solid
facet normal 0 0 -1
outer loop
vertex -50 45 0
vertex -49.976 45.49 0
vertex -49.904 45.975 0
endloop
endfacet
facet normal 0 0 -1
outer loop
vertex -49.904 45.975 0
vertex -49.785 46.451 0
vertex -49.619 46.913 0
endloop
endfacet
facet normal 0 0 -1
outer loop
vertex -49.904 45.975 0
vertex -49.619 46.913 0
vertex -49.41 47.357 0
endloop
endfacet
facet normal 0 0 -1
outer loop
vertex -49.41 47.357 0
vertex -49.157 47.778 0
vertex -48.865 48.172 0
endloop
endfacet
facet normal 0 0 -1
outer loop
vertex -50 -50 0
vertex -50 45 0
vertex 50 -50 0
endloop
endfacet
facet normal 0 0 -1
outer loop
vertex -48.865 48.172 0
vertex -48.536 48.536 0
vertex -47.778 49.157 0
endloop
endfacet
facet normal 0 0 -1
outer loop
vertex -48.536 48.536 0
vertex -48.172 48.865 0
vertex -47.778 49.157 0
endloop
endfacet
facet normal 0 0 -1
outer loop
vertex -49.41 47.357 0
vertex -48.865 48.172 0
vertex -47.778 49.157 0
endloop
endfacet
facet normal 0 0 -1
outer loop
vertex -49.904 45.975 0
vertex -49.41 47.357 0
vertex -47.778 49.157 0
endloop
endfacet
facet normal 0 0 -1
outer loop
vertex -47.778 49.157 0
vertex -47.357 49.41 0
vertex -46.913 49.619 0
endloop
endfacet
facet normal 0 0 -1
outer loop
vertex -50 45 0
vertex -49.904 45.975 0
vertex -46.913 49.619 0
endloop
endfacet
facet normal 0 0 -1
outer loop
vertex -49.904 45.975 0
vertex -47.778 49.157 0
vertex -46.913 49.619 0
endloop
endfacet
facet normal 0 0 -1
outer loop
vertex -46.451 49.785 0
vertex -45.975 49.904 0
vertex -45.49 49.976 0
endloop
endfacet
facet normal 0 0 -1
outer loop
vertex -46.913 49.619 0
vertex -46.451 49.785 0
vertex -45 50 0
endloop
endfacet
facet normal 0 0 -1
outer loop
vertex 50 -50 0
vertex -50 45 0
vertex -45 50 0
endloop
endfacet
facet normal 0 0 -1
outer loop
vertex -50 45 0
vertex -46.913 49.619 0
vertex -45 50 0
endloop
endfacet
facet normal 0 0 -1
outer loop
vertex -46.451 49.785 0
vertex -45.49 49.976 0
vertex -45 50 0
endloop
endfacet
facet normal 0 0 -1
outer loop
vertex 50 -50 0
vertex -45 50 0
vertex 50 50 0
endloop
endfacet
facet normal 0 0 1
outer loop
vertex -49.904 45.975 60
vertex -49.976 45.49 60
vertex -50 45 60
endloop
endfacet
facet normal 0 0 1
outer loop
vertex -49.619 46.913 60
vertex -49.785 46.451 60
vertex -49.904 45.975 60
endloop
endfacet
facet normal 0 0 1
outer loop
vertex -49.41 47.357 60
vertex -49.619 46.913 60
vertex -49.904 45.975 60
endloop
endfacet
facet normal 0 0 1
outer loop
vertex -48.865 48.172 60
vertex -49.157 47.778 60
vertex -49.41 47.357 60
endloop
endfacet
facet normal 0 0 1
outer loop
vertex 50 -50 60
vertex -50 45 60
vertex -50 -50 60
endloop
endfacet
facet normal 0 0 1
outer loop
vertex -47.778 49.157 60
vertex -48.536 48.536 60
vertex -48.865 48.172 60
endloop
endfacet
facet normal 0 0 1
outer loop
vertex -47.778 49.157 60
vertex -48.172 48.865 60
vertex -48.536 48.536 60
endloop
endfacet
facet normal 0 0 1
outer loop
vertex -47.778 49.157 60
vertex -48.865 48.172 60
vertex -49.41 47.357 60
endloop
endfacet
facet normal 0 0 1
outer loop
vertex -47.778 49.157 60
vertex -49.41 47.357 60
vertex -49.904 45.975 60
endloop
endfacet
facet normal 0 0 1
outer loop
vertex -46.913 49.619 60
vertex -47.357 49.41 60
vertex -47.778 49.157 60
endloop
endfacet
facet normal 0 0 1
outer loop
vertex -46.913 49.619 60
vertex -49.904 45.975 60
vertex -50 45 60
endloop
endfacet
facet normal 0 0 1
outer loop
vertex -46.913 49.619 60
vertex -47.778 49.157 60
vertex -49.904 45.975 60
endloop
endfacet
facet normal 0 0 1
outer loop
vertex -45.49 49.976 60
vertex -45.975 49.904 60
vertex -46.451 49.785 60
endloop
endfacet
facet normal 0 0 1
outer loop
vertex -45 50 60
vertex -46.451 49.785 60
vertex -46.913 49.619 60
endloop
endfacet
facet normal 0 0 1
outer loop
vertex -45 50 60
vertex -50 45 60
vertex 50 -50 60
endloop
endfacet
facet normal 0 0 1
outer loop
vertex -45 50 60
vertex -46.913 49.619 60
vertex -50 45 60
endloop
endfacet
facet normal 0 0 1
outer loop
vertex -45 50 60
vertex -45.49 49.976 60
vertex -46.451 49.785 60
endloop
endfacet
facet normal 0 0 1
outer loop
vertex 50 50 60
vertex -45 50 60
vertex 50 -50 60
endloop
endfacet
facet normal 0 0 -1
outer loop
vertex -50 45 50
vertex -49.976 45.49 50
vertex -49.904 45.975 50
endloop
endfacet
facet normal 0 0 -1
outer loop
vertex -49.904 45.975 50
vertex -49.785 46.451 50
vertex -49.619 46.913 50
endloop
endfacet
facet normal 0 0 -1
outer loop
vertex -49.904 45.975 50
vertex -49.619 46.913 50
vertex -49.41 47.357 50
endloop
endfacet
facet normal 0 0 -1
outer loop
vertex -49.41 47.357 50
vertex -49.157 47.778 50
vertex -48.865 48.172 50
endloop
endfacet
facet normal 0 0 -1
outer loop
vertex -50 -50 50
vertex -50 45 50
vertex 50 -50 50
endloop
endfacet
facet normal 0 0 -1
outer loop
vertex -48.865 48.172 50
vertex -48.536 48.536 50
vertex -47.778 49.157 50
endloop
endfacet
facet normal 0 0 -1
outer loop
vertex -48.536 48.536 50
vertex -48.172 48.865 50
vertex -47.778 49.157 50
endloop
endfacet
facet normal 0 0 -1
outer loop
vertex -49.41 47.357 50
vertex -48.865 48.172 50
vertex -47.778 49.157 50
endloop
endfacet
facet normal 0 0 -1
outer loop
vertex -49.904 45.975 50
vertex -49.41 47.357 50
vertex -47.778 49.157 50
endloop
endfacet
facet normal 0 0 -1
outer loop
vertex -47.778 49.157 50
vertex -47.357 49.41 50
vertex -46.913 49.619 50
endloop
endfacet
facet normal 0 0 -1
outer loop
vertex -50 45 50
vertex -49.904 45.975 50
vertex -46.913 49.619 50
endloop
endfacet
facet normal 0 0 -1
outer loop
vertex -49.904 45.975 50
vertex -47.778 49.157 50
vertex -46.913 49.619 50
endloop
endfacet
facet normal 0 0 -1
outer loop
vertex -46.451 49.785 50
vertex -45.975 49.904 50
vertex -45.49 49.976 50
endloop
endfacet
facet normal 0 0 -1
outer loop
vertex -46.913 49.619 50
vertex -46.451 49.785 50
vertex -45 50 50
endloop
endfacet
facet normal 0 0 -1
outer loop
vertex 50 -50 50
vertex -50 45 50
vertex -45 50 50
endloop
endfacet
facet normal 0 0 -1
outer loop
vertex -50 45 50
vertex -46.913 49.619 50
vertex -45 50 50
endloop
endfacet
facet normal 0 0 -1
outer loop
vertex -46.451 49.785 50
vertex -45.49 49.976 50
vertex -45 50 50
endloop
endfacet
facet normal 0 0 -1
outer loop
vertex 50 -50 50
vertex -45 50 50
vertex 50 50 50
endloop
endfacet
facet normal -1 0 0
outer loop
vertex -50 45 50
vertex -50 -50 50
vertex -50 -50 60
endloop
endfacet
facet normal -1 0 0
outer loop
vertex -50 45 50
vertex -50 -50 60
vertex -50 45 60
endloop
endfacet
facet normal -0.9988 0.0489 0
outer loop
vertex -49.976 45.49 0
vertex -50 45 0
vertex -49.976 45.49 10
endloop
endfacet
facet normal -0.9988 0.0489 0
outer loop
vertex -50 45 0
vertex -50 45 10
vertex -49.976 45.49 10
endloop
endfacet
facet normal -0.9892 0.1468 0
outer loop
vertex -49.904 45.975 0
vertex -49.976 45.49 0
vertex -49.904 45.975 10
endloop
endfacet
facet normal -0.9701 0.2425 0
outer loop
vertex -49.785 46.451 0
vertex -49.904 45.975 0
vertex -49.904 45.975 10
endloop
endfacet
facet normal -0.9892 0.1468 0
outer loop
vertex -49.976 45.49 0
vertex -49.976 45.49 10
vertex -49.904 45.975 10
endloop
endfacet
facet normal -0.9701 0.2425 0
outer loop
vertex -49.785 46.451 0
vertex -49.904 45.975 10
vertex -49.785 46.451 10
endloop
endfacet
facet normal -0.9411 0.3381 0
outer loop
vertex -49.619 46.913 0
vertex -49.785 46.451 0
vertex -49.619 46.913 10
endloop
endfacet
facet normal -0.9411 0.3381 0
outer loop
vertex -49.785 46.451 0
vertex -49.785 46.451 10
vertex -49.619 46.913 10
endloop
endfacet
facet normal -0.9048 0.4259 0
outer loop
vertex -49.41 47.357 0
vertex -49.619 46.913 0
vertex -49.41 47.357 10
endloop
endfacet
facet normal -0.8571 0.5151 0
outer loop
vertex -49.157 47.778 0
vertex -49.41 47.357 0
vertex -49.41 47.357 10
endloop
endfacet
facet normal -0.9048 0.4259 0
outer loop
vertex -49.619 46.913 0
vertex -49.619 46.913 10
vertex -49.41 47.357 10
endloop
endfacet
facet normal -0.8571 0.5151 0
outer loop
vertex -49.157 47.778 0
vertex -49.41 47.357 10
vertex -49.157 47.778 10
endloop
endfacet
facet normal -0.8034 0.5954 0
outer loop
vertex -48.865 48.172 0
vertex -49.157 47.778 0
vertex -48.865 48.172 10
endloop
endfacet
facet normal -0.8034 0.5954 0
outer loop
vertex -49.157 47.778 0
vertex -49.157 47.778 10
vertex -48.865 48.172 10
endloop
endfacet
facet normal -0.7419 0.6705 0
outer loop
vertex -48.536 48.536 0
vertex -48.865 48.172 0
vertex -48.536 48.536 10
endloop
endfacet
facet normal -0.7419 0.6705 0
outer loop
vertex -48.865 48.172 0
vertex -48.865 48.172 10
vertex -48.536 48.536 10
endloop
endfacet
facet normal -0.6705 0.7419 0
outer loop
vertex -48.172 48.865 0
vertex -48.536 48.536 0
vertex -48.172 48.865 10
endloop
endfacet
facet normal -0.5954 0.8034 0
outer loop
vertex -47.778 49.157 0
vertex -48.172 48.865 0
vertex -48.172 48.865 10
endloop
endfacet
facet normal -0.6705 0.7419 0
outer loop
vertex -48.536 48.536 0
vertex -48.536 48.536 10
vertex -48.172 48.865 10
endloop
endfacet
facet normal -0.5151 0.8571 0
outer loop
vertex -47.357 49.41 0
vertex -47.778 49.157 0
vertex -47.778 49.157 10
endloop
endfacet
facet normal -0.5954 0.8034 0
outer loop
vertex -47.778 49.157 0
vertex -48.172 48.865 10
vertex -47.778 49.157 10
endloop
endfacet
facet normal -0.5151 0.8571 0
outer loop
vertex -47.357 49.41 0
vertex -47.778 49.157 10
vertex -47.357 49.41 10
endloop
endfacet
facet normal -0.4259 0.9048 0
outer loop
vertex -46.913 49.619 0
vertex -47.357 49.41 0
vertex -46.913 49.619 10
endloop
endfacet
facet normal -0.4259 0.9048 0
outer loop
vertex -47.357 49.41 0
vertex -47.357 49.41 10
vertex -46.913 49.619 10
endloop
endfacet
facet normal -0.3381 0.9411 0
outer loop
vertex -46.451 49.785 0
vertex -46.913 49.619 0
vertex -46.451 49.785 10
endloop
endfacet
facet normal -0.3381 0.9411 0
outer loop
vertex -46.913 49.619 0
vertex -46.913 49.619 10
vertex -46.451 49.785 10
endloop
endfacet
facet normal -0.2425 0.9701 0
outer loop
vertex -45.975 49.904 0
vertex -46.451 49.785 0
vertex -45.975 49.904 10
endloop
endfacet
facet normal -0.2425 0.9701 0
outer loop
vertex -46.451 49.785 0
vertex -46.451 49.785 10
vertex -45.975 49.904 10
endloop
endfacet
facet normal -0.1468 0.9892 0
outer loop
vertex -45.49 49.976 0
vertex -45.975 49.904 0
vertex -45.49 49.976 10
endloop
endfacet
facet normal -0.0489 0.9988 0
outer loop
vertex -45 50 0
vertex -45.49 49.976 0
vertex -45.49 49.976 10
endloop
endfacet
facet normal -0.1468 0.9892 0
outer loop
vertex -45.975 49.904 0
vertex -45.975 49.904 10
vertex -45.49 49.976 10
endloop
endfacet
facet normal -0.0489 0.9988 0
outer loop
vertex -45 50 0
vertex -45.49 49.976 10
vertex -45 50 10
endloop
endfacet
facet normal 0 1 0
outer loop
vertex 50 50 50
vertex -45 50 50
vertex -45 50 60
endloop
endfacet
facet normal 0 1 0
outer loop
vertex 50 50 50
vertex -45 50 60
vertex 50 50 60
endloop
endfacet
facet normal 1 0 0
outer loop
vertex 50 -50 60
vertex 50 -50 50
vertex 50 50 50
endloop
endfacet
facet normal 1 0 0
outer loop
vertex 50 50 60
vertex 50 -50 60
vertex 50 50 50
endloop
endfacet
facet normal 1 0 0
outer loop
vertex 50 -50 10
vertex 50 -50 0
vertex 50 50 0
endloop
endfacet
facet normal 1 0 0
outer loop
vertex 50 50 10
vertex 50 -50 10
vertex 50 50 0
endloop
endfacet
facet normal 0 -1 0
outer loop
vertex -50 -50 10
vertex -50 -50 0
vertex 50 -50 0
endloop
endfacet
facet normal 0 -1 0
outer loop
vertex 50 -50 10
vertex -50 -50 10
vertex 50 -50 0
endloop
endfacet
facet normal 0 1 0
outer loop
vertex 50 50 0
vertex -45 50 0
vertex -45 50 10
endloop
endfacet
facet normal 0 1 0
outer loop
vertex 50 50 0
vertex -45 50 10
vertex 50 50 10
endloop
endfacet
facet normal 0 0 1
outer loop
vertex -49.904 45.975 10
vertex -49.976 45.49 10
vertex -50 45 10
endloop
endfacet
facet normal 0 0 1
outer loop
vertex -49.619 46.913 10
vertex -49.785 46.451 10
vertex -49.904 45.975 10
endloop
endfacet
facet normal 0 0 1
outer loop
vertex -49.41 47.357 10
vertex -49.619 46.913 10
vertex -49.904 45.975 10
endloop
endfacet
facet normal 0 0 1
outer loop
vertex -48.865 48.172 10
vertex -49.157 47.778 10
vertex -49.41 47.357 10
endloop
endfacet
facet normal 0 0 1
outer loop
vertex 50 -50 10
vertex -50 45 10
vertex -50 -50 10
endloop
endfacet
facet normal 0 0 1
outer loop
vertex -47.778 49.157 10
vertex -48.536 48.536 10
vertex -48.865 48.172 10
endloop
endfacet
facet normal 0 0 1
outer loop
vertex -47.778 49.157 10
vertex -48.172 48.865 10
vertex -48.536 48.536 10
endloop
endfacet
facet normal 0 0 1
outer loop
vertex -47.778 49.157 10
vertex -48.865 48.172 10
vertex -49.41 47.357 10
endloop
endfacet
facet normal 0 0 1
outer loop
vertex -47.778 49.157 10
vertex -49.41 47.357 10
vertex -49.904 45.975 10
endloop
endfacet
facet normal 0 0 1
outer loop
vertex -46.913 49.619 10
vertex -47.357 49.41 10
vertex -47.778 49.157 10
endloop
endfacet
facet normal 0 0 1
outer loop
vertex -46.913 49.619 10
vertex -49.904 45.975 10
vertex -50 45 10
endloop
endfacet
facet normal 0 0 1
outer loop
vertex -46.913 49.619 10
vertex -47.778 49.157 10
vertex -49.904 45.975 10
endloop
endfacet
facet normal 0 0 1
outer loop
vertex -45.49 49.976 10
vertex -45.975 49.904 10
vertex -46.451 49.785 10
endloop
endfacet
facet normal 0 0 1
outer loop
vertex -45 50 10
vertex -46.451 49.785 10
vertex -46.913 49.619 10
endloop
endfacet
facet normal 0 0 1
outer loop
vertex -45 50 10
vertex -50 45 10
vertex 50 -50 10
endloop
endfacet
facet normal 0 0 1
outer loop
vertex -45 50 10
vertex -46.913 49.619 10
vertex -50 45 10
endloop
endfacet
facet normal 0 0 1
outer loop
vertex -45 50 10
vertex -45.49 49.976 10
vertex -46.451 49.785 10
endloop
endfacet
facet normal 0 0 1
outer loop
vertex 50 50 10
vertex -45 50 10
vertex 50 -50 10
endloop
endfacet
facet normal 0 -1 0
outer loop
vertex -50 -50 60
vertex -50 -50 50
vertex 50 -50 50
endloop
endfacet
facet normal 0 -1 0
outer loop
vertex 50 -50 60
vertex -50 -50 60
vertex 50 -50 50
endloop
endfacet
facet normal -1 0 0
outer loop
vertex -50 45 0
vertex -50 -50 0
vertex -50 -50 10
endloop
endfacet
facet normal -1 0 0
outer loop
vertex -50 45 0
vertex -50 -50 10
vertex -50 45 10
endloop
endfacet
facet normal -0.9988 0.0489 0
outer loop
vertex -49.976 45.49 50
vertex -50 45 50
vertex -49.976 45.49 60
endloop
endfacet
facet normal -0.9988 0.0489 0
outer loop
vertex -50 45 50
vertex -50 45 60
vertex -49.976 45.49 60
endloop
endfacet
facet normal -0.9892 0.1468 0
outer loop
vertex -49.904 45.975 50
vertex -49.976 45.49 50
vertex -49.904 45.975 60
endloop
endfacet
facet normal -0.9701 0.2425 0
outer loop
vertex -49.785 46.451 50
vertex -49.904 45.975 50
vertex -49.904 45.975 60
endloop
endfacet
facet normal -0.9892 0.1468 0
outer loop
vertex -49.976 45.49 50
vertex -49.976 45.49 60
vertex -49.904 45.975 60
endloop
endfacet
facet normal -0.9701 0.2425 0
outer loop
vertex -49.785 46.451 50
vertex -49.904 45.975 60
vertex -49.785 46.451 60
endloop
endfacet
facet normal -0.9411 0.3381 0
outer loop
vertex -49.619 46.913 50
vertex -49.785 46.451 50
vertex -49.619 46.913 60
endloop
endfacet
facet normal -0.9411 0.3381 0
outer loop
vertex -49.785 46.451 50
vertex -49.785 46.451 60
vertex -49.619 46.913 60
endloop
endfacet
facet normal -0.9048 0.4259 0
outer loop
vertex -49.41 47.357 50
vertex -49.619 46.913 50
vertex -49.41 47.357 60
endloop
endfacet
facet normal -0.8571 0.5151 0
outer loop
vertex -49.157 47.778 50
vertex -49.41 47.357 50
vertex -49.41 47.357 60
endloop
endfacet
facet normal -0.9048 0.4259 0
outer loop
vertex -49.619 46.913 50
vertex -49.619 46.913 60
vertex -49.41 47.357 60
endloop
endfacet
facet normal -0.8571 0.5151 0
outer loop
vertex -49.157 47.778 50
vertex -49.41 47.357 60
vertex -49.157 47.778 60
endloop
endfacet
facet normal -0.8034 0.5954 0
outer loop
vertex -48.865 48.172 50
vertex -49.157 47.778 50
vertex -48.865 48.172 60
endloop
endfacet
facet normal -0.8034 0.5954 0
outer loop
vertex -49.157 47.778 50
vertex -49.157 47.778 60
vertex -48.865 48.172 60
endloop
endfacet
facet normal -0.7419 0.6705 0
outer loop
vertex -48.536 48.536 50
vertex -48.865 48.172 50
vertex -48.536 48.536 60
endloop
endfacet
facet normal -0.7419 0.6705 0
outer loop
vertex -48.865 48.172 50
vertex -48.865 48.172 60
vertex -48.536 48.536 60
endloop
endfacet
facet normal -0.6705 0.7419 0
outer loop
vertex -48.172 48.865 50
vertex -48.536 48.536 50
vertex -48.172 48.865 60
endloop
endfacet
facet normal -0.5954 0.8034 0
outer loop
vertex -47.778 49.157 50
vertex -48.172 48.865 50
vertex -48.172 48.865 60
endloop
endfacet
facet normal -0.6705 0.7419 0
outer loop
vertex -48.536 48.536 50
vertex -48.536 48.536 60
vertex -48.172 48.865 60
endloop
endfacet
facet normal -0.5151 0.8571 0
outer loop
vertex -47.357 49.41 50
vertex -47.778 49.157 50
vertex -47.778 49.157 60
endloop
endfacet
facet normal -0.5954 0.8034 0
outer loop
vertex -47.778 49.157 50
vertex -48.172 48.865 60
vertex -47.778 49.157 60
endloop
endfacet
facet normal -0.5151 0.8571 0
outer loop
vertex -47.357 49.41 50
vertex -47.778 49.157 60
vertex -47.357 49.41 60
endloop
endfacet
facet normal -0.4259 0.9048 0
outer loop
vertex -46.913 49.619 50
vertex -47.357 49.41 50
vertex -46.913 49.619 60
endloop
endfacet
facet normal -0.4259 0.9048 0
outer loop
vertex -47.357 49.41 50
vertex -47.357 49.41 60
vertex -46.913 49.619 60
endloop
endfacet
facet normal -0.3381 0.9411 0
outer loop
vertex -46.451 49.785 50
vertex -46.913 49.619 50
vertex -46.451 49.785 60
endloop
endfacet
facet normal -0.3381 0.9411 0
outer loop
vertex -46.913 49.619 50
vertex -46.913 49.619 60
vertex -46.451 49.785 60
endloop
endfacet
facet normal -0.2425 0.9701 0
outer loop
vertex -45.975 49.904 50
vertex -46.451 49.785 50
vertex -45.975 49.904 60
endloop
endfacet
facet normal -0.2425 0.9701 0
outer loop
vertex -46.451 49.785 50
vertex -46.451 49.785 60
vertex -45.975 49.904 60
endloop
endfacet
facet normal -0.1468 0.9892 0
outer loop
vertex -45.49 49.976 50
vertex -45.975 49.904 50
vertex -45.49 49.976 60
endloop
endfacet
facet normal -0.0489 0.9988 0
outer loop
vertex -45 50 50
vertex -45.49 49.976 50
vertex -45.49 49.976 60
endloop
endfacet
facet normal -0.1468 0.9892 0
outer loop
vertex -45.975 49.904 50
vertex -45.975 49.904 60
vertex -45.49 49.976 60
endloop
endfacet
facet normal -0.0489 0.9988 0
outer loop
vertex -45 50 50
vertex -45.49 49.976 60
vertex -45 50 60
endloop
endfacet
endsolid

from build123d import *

# Parameters (mm, degrees)
F0_W      = 100
F0_H      = 100
F1_DEPTH  = 60
F3_START  = -10
F1_FACE_W = 100
F1_FACE_H = 100
F3_DEPTH  = 40
F4_R      = 5


with BuildPart() as f1:
    # F0 (on Top) → F1 (new body)
    with BuildSketch(Plane.XY):
        Rectangle(F0_W, F0_H)
    extrude(amount=F1_DEPTH)

    # F1_face (on face) → F3 (cut)
    with BuildSketch(Plane.XY.offset(60).offset(F3_START)):
        Rectangle(F1_FACE_W, F1_FACE_H)
    extrude(amount=-F3_DEPTH, mode=Mode.SUBTRACT)

    # F4
    f4_edges = [f1.edges().sort_by_distance(p)[0] for p in [
        (-50, 50, 5),
        (-50, 50, 55),
    ]]
    fillet(f4_edges, radius=F4_R)


solid = f1.part
